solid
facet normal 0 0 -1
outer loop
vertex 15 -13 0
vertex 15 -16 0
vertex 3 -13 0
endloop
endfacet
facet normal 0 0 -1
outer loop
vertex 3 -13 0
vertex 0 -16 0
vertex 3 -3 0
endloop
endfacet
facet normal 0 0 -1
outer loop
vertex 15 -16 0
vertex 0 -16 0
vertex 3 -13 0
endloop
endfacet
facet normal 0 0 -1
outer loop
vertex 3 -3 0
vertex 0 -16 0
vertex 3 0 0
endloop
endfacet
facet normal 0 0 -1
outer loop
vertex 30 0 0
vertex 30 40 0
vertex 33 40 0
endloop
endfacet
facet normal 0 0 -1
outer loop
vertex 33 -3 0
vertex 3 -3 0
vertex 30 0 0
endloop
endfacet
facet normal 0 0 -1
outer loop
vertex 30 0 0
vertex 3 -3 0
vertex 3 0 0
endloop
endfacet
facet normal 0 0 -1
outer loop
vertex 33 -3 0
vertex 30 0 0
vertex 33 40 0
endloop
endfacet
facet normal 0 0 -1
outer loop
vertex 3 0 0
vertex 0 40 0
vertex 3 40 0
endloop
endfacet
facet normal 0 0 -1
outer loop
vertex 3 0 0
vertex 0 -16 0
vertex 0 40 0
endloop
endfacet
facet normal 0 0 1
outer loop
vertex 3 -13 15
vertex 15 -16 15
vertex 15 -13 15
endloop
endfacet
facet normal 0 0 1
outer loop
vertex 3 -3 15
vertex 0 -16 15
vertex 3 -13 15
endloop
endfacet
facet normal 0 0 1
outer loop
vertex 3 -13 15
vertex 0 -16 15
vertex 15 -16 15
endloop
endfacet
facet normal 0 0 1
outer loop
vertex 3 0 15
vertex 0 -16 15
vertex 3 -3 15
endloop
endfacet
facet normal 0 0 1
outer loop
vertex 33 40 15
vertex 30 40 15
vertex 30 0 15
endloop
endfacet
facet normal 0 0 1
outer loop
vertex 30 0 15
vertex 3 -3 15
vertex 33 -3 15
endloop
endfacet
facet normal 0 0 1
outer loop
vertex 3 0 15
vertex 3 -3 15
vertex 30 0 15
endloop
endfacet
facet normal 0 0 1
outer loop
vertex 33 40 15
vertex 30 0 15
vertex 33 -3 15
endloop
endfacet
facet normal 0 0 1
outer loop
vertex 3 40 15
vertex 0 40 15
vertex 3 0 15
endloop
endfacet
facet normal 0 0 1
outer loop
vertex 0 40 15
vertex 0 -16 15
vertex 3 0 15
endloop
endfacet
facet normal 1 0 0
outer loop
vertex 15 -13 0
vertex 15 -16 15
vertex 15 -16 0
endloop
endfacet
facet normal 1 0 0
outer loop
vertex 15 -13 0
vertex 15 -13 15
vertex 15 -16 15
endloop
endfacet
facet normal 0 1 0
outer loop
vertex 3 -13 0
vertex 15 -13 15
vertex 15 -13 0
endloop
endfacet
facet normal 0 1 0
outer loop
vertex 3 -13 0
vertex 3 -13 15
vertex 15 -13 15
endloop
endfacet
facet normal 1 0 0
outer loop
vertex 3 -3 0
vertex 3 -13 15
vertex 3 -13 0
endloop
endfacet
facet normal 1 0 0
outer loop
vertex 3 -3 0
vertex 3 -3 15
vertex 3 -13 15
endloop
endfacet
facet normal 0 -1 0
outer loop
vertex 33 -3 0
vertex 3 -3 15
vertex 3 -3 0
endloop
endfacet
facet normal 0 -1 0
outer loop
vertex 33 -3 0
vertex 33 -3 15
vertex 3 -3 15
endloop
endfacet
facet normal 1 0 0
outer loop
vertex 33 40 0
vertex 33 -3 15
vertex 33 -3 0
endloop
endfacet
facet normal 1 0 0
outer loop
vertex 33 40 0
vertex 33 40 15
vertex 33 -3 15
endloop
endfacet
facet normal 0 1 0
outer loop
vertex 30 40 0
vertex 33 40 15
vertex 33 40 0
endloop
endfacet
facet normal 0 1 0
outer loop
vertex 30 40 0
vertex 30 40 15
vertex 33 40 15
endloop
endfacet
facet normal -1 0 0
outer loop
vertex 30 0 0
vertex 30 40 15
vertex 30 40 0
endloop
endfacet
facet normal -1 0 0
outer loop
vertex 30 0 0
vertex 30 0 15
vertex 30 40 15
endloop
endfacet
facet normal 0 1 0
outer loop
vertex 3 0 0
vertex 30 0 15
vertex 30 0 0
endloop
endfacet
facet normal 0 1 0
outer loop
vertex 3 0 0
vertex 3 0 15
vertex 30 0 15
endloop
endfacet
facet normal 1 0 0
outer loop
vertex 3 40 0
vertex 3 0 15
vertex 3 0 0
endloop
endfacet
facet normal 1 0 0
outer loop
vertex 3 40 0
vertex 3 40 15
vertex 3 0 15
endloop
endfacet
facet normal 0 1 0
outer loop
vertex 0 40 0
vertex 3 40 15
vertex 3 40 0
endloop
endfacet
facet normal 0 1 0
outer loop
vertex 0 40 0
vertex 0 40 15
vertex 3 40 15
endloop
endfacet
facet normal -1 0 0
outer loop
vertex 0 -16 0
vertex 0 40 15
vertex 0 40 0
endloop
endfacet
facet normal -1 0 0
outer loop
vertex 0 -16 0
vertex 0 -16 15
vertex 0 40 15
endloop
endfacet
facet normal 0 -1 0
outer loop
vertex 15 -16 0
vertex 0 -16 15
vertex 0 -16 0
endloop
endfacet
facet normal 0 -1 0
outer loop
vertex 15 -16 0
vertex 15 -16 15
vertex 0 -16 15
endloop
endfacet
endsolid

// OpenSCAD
desk_width = 27;
depth_into_table = 40;
plastic_width = 3;
piece_width = 15;
hook_depth= 10;
hook_height= 15;


linear_extrude(piece_width)
union(){
    square([plastic_width, depth_into_table]);

    translate([plastic_width + desk_width,0,0])
        square([plastic_width, depth_into_table]);

    translate([0, -plastic_width, 0])
        square([desk_width + 2*plastic_width, plastic_width]);

    translate([0, -1*(plastic_width) - hook_depth, 0])
        square([plastic_width, hook_depth]);

    translate([0, -2*(plastic_width) - hook_depth, 0])
        square([hook_height, plastic_width]);
};
